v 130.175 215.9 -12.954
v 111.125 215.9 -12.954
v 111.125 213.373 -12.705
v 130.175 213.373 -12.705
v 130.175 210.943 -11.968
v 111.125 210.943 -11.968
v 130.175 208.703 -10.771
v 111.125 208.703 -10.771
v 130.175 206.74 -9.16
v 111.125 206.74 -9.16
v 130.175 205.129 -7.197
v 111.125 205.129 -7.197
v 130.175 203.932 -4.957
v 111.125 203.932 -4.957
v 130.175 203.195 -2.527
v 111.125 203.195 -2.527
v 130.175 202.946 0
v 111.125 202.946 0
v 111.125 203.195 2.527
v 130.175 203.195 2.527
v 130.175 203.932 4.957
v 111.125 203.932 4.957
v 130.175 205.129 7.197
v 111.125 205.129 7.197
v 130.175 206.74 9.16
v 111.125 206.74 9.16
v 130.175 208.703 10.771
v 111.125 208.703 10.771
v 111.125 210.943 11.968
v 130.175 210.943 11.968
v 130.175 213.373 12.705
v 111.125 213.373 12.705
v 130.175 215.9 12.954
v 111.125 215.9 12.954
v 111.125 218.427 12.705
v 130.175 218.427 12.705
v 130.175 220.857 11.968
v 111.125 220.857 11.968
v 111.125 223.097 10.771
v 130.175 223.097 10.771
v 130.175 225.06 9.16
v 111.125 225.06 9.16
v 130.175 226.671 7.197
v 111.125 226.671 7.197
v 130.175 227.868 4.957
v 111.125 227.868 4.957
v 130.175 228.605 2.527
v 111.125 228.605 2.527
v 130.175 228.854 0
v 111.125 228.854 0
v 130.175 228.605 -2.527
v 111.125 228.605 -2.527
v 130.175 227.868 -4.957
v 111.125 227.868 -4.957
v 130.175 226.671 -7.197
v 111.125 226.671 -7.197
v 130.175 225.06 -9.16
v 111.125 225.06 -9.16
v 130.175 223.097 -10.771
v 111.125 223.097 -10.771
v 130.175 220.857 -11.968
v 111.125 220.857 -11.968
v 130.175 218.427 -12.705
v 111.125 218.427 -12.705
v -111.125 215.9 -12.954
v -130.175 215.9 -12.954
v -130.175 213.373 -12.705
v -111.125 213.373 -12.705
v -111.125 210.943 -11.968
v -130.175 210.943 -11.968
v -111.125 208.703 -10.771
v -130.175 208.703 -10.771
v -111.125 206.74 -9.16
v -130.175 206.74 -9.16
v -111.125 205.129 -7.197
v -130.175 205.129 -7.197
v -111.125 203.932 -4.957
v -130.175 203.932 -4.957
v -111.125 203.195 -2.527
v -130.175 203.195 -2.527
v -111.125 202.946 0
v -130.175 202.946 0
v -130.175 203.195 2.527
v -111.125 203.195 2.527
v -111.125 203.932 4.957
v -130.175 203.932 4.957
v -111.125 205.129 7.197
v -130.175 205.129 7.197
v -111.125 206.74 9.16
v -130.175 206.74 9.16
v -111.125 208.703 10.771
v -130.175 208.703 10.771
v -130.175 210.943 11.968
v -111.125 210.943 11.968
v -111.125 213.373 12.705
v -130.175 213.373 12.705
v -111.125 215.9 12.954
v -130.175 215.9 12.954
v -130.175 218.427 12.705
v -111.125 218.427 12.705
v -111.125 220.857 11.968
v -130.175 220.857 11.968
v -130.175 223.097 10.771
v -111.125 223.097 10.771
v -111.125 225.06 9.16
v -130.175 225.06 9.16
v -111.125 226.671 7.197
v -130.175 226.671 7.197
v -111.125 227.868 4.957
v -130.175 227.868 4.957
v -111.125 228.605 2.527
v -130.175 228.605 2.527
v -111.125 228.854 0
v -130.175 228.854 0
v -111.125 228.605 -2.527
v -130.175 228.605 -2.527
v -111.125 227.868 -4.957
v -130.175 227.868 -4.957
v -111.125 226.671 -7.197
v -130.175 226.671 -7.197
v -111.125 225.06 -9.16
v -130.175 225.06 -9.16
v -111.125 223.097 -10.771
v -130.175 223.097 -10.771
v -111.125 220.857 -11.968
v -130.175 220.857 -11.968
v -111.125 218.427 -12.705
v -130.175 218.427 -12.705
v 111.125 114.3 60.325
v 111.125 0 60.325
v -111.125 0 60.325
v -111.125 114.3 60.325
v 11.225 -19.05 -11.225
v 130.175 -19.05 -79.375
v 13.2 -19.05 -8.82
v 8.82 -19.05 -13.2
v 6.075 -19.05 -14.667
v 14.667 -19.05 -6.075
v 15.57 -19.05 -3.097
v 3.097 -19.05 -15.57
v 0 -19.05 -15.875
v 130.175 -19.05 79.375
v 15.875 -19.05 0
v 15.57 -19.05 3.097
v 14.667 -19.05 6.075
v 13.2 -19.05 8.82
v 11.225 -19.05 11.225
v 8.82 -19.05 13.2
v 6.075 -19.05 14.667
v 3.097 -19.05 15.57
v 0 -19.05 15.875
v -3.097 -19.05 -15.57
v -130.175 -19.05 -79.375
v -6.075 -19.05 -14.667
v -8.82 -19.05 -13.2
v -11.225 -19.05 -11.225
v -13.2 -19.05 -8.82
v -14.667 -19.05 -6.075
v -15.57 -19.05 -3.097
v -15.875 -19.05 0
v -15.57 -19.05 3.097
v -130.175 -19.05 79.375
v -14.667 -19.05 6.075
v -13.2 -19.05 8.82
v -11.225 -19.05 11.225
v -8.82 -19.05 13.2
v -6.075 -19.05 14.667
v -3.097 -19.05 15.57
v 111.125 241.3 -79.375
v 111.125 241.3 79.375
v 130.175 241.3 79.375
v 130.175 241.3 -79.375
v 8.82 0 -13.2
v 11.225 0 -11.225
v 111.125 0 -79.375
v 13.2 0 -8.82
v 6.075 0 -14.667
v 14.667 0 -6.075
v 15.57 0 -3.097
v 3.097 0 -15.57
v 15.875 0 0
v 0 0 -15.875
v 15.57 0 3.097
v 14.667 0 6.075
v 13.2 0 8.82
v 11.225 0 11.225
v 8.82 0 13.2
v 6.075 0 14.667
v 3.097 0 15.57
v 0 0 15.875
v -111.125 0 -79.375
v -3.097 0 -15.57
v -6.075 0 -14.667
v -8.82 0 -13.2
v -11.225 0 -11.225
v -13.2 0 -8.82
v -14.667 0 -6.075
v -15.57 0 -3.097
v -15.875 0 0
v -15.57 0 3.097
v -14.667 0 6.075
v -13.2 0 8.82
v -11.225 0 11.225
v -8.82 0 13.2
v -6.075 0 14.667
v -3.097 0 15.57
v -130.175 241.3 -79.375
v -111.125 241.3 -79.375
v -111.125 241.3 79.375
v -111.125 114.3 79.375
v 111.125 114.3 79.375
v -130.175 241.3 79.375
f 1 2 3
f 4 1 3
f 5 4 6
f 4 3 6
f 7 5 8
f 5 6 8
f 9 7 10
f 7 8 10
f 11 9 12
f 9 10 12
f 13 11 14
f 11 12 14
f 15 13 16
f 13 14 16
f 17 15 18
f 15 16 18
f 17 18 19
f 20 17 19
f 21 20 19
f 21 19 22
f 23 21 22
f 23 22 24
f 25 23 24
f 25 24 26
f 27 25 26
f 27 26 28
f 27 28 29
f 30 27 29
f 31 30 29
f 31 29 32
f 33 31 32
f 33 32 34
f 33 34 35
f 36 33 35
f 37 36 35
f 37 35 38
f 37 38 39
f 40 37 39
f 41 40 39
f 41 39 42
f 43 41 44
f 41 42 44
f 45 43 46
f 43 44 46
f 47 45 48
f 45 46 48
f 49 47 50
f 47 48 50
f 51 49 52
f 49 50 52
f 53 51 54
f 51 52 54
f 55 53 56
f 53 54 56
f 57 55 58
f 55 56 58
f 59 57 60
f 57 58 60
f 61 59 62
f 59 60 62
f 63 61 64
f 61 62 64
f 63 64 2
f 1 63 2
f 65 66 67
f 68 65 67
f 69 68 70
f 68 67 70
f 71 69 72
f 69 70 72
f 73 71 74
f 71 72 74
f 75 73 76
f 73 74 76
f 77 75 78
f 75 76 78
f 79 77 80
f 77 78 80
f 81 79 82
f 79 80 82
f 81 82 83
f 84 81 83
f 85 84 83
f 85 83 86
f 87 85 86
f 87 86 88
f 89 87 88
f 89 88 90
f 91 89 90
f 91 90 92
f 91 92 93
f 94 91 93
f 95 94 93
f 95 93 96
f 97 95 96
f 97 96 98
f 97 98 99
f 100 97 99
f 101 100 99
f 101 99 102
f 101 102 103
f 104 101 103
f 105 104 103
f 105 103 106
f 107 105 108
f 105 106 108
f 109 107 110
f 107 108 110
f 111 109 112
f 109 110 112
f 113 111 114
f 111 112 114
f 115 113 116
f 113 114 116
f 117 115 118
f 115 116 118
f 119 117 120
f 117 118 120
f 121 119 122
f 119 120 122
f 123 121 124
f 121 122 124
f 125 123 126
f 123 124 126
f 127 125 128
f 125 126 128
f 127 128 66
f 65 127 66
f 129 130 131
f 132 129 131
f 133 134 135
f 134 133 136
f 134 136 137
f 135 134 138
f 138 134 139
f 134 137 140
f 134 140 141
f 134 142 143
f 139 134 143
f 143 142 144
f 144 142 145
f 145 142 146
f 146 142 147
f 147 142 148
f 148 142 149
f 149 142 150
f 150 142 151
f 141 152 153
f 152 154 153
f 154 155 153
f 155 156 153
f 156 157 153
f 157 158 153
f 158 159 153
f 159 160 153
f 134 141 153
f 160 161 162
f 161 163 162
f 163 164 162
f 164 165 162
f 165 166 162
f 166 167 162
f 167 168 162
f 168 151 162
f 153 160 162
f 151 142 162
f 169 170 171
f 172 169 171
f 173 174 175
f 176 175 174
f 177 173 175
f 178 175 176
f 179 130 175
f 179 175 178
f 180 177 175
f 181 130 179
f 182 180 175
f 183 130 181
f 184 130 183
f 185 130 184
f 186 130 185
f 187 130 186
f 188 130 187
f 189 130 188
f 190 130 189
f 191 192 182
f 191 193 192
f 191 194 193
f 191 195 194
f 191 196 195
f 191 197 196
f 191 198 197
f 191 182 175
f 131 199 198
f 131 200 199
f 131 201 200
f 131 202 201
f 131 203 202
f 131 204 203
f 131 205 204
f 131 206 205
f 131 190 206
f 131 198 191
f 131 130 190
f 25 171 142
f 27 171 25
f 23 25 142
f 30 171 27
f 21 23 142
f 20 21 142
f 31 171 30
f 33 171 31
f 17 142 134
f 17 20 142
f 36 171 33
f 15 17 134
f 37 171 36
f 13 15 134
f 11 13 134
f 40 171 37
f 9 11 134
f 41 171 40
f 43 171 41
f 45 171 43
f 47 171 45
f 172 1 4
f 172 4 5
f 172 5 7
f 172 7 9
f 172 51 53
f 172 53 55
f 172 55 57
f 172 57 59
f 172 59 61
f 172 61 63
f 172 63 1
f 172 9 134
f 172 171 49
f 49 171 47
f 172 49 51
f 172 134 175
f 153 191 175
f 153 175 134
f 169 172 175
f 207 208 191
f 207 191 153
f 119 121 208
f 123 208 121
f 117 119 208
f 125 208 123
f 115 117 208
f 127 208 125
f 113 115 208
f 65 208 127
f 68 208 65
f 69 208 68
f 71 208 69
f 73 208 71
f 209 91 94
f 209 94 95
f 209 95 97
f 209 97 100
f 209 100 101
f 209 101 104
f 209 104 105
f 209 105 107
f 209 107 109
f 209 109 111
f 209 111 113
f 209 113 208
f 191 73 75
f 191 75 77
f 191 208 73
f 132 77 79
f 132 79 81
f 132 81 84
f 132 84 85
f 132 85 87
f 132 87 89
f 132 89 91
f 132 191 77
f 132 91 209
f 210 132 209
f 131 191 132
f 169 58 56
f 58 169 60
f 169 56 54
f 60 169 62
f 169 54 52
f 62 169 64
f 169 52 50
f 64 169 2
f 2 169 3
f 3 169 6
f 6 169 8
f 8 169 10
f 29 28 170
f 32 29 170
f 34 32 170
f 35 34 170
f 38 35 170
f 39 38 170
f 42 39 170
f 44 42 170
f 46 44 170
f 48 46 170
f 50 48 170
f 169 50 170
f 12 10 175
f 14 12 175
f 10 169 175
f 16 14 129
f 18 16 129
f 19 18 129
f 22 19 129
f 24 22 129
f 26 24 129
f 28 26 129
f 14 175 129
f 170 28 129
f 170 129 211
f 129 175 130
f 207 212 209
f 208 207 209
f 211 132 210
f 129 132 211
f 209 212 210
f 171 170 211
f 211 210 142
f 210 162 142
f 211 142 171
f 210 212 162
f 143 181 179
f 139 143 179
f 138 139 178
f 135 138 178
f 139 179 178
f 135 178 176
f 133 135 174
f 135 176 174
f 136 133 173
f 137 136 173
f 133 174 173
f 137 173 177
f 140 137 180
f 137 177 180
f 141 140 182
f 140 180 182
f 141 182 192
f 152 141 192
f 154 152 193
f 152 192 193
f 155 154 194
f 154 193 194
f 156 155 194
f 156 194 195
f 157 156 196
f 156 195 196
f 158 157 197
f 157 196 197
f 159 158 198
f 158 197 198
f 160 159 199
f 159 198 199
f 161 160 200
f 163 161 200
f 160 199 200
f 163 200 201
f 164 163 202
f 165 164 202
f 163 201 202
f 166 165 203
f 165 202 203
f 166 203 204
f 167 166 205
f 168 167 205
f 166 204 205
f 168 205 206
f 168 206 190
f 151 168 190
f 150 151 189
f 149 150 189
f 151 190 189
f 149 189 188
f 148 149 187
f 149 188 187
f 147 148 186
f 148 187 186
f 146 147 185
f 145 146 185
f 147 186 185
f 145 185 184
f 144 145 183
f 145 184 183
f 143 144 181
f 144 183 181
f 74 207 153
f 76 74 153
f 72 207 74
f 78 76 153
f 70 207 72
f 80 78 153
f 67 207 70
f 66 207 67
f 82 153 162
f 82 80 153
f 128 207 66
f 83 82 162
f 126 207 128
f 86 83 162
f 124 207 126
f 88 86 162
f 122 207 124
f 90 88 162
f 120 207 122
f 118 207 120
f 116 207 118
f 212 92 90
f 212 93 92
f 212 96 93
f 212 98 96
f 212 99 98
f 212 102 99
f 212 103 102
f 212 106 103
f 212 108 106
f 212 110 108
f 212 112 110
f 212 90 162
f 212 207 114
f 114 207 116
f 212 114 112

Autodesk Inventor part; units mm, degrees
ref_plane "YZ Plane" through (0, 0, 0) normal (1, 0, 0) x (0, 1, 0)
ref_plane "XZ Plane" through (0, 0, 0) normal (0, 1, 0) x (-1, 0, 0)
ref_plane "XY Plane" through (0, 0, 0) normal (0, 0, 1) x (1, 0, 0)
sketch "Sketch1" plane through (0, 0, 0) normal (0, 1, 0) x (-1, 0, 0)
  line L0 (130.175, 79.375) -> (-130.175, 79.375)
  line L1 (-130.175, 79.375) -> (-130.175, -79.375)
  line L2 (-130.175, -79.375) -> (130.175, -79.375)
  line L3 (130.175, -79.375) -> (130.175, 79.375)
  line L4 (130.175, 79.375) -> (-130.175, -79.375) construction
  line L5 (-130.175, 79.375) -> (130.175, -79.375) construction
  point P0 (0, 0)
  dimension "d0" = 260.35
  dimension "d1" = 158.75
extrude "Base" add sketch "Sketch1" against normal blind 19.05
sketch "Sketch2" plane through (0, 0, 0) normal (0, 1, 0) x (1, 0, 0)
  line L0 (-130.175, -79.375) -> (-130.175, 79.375) projected
  line L1 (-130.175, 79.375) -> (-111.125, 79.375)
  line L2 (-111.125, 79.375) -> (-111.125, -79.375)
  line L3 (-111.125, -79.375) -> (-130.175, -79.375)
  line L4 (-130.175, -79.375) -> (-130.175, 79.375)
  line L5 (130.175, 79.375) -> (130.175, -79.375) projected
  line L6 (130.175, -79.375) -> (-130.175, -79.375) projected
  line L7 (130.175, 79.375) -> (111.125, 79.375)
  line L8 (111.125, 79.375) -> (111.125, -79.375)
  line L9 (111.125, -79.375) -> (130.175, -79.375)
  line L10 (130.175, -79.375) -> (130.175, 79.375)
  line L11 (-130.175, -79.375) -> (130.175, -79.375) projected
  point P0 (0, 0)
  dimension "d4" = 19.05
extrude "Sides" add sketch "Sketch2" along normal blind 241.3
sketch "Sketch3" plane through (0, 0, 0) normal (0, 1, 0) x (1, 0, 0)
  line L0 (-130.175, -79.375) -> (-111.125, -79.375) projected
  line L1 (111.125, 79.375) -> (111.125, -79.375) projected
  line L2 (-111.125, -79.375) -> (111.125, -79.375)
  line L3 (111.125, -79.375) -> (111.125, -60.325)
  line L4 (111.125, -60.325) -> (-111.125, -60.325)
  line L5 (-111.125, -60.325) -> (-111.125, -79.375)
  point P0 (0, 0)
  point P1 (111.125, -79.375)
  dimension "d7" = 19.05
extrude "FrontPiece" add sketch "Sketch3" along normal blind 114.3
sketch "Sketch5" plane through (130.175, -19.05, 79.375) normal (1, 0, 0) x (0, 0, -1)
  line L0 (158.75, 260.35) -> (0, 260.35) construction
  line L1 (79.375, 260.35) -> (79.375, 0) construction
  line L2 (0, 0) -> (158.75, 0) construction
  line L3 (19.05, 19.05) -> (158.75, 19.05) projected
  point P0 (79.375, 19.05)
  point P1 (79.375, 234.95)
  dimension "d23" = 215.9
hole "HoleForSides" at (130.175, 215.9, 0) direction (-1, 0, 0) diameter 25.908 end through all
sketch "Sketch8" plane through (0, 0, 0) normal (0, 1, 0) x (1, 0, 0)
  circle A0 centre (0, 0) radius 15.875
  dimension "d27" = 31.75
extrude "BottomHole" cut sketch "Sketch8" against normal through all
equation "\"d0\" = interiorWidth + 2 * woodThickness"
equation "\"d1\" = partDepth"
equation "\"d2\" = woodThickness"
equation "\"d4\" = woodThickness"
equation "\"d5\" = totalHeight - woodThickness"
equation "\"d7\" = woodThickness"
equation "\"d8\" = supportBoardHeight"
equation "\"d23\" = holeCenter"
equation "\"d13\" = holeDiameter"
equation "\"interiorWidth\" = 222.25"
equation "\"woodThickness\" = 19.05"
equation "\"holeCenter\" = 215.9"
equation "\"supportBoardHeight\" = 114.3"
equation "\"holeDiameter\" = 25.908"
equation "\"partDepth\" = 158.75"
equation "\"totalHeight\" = 260.35"
properties part number "woodForkAssembly02" material "Wood (Birch)"
